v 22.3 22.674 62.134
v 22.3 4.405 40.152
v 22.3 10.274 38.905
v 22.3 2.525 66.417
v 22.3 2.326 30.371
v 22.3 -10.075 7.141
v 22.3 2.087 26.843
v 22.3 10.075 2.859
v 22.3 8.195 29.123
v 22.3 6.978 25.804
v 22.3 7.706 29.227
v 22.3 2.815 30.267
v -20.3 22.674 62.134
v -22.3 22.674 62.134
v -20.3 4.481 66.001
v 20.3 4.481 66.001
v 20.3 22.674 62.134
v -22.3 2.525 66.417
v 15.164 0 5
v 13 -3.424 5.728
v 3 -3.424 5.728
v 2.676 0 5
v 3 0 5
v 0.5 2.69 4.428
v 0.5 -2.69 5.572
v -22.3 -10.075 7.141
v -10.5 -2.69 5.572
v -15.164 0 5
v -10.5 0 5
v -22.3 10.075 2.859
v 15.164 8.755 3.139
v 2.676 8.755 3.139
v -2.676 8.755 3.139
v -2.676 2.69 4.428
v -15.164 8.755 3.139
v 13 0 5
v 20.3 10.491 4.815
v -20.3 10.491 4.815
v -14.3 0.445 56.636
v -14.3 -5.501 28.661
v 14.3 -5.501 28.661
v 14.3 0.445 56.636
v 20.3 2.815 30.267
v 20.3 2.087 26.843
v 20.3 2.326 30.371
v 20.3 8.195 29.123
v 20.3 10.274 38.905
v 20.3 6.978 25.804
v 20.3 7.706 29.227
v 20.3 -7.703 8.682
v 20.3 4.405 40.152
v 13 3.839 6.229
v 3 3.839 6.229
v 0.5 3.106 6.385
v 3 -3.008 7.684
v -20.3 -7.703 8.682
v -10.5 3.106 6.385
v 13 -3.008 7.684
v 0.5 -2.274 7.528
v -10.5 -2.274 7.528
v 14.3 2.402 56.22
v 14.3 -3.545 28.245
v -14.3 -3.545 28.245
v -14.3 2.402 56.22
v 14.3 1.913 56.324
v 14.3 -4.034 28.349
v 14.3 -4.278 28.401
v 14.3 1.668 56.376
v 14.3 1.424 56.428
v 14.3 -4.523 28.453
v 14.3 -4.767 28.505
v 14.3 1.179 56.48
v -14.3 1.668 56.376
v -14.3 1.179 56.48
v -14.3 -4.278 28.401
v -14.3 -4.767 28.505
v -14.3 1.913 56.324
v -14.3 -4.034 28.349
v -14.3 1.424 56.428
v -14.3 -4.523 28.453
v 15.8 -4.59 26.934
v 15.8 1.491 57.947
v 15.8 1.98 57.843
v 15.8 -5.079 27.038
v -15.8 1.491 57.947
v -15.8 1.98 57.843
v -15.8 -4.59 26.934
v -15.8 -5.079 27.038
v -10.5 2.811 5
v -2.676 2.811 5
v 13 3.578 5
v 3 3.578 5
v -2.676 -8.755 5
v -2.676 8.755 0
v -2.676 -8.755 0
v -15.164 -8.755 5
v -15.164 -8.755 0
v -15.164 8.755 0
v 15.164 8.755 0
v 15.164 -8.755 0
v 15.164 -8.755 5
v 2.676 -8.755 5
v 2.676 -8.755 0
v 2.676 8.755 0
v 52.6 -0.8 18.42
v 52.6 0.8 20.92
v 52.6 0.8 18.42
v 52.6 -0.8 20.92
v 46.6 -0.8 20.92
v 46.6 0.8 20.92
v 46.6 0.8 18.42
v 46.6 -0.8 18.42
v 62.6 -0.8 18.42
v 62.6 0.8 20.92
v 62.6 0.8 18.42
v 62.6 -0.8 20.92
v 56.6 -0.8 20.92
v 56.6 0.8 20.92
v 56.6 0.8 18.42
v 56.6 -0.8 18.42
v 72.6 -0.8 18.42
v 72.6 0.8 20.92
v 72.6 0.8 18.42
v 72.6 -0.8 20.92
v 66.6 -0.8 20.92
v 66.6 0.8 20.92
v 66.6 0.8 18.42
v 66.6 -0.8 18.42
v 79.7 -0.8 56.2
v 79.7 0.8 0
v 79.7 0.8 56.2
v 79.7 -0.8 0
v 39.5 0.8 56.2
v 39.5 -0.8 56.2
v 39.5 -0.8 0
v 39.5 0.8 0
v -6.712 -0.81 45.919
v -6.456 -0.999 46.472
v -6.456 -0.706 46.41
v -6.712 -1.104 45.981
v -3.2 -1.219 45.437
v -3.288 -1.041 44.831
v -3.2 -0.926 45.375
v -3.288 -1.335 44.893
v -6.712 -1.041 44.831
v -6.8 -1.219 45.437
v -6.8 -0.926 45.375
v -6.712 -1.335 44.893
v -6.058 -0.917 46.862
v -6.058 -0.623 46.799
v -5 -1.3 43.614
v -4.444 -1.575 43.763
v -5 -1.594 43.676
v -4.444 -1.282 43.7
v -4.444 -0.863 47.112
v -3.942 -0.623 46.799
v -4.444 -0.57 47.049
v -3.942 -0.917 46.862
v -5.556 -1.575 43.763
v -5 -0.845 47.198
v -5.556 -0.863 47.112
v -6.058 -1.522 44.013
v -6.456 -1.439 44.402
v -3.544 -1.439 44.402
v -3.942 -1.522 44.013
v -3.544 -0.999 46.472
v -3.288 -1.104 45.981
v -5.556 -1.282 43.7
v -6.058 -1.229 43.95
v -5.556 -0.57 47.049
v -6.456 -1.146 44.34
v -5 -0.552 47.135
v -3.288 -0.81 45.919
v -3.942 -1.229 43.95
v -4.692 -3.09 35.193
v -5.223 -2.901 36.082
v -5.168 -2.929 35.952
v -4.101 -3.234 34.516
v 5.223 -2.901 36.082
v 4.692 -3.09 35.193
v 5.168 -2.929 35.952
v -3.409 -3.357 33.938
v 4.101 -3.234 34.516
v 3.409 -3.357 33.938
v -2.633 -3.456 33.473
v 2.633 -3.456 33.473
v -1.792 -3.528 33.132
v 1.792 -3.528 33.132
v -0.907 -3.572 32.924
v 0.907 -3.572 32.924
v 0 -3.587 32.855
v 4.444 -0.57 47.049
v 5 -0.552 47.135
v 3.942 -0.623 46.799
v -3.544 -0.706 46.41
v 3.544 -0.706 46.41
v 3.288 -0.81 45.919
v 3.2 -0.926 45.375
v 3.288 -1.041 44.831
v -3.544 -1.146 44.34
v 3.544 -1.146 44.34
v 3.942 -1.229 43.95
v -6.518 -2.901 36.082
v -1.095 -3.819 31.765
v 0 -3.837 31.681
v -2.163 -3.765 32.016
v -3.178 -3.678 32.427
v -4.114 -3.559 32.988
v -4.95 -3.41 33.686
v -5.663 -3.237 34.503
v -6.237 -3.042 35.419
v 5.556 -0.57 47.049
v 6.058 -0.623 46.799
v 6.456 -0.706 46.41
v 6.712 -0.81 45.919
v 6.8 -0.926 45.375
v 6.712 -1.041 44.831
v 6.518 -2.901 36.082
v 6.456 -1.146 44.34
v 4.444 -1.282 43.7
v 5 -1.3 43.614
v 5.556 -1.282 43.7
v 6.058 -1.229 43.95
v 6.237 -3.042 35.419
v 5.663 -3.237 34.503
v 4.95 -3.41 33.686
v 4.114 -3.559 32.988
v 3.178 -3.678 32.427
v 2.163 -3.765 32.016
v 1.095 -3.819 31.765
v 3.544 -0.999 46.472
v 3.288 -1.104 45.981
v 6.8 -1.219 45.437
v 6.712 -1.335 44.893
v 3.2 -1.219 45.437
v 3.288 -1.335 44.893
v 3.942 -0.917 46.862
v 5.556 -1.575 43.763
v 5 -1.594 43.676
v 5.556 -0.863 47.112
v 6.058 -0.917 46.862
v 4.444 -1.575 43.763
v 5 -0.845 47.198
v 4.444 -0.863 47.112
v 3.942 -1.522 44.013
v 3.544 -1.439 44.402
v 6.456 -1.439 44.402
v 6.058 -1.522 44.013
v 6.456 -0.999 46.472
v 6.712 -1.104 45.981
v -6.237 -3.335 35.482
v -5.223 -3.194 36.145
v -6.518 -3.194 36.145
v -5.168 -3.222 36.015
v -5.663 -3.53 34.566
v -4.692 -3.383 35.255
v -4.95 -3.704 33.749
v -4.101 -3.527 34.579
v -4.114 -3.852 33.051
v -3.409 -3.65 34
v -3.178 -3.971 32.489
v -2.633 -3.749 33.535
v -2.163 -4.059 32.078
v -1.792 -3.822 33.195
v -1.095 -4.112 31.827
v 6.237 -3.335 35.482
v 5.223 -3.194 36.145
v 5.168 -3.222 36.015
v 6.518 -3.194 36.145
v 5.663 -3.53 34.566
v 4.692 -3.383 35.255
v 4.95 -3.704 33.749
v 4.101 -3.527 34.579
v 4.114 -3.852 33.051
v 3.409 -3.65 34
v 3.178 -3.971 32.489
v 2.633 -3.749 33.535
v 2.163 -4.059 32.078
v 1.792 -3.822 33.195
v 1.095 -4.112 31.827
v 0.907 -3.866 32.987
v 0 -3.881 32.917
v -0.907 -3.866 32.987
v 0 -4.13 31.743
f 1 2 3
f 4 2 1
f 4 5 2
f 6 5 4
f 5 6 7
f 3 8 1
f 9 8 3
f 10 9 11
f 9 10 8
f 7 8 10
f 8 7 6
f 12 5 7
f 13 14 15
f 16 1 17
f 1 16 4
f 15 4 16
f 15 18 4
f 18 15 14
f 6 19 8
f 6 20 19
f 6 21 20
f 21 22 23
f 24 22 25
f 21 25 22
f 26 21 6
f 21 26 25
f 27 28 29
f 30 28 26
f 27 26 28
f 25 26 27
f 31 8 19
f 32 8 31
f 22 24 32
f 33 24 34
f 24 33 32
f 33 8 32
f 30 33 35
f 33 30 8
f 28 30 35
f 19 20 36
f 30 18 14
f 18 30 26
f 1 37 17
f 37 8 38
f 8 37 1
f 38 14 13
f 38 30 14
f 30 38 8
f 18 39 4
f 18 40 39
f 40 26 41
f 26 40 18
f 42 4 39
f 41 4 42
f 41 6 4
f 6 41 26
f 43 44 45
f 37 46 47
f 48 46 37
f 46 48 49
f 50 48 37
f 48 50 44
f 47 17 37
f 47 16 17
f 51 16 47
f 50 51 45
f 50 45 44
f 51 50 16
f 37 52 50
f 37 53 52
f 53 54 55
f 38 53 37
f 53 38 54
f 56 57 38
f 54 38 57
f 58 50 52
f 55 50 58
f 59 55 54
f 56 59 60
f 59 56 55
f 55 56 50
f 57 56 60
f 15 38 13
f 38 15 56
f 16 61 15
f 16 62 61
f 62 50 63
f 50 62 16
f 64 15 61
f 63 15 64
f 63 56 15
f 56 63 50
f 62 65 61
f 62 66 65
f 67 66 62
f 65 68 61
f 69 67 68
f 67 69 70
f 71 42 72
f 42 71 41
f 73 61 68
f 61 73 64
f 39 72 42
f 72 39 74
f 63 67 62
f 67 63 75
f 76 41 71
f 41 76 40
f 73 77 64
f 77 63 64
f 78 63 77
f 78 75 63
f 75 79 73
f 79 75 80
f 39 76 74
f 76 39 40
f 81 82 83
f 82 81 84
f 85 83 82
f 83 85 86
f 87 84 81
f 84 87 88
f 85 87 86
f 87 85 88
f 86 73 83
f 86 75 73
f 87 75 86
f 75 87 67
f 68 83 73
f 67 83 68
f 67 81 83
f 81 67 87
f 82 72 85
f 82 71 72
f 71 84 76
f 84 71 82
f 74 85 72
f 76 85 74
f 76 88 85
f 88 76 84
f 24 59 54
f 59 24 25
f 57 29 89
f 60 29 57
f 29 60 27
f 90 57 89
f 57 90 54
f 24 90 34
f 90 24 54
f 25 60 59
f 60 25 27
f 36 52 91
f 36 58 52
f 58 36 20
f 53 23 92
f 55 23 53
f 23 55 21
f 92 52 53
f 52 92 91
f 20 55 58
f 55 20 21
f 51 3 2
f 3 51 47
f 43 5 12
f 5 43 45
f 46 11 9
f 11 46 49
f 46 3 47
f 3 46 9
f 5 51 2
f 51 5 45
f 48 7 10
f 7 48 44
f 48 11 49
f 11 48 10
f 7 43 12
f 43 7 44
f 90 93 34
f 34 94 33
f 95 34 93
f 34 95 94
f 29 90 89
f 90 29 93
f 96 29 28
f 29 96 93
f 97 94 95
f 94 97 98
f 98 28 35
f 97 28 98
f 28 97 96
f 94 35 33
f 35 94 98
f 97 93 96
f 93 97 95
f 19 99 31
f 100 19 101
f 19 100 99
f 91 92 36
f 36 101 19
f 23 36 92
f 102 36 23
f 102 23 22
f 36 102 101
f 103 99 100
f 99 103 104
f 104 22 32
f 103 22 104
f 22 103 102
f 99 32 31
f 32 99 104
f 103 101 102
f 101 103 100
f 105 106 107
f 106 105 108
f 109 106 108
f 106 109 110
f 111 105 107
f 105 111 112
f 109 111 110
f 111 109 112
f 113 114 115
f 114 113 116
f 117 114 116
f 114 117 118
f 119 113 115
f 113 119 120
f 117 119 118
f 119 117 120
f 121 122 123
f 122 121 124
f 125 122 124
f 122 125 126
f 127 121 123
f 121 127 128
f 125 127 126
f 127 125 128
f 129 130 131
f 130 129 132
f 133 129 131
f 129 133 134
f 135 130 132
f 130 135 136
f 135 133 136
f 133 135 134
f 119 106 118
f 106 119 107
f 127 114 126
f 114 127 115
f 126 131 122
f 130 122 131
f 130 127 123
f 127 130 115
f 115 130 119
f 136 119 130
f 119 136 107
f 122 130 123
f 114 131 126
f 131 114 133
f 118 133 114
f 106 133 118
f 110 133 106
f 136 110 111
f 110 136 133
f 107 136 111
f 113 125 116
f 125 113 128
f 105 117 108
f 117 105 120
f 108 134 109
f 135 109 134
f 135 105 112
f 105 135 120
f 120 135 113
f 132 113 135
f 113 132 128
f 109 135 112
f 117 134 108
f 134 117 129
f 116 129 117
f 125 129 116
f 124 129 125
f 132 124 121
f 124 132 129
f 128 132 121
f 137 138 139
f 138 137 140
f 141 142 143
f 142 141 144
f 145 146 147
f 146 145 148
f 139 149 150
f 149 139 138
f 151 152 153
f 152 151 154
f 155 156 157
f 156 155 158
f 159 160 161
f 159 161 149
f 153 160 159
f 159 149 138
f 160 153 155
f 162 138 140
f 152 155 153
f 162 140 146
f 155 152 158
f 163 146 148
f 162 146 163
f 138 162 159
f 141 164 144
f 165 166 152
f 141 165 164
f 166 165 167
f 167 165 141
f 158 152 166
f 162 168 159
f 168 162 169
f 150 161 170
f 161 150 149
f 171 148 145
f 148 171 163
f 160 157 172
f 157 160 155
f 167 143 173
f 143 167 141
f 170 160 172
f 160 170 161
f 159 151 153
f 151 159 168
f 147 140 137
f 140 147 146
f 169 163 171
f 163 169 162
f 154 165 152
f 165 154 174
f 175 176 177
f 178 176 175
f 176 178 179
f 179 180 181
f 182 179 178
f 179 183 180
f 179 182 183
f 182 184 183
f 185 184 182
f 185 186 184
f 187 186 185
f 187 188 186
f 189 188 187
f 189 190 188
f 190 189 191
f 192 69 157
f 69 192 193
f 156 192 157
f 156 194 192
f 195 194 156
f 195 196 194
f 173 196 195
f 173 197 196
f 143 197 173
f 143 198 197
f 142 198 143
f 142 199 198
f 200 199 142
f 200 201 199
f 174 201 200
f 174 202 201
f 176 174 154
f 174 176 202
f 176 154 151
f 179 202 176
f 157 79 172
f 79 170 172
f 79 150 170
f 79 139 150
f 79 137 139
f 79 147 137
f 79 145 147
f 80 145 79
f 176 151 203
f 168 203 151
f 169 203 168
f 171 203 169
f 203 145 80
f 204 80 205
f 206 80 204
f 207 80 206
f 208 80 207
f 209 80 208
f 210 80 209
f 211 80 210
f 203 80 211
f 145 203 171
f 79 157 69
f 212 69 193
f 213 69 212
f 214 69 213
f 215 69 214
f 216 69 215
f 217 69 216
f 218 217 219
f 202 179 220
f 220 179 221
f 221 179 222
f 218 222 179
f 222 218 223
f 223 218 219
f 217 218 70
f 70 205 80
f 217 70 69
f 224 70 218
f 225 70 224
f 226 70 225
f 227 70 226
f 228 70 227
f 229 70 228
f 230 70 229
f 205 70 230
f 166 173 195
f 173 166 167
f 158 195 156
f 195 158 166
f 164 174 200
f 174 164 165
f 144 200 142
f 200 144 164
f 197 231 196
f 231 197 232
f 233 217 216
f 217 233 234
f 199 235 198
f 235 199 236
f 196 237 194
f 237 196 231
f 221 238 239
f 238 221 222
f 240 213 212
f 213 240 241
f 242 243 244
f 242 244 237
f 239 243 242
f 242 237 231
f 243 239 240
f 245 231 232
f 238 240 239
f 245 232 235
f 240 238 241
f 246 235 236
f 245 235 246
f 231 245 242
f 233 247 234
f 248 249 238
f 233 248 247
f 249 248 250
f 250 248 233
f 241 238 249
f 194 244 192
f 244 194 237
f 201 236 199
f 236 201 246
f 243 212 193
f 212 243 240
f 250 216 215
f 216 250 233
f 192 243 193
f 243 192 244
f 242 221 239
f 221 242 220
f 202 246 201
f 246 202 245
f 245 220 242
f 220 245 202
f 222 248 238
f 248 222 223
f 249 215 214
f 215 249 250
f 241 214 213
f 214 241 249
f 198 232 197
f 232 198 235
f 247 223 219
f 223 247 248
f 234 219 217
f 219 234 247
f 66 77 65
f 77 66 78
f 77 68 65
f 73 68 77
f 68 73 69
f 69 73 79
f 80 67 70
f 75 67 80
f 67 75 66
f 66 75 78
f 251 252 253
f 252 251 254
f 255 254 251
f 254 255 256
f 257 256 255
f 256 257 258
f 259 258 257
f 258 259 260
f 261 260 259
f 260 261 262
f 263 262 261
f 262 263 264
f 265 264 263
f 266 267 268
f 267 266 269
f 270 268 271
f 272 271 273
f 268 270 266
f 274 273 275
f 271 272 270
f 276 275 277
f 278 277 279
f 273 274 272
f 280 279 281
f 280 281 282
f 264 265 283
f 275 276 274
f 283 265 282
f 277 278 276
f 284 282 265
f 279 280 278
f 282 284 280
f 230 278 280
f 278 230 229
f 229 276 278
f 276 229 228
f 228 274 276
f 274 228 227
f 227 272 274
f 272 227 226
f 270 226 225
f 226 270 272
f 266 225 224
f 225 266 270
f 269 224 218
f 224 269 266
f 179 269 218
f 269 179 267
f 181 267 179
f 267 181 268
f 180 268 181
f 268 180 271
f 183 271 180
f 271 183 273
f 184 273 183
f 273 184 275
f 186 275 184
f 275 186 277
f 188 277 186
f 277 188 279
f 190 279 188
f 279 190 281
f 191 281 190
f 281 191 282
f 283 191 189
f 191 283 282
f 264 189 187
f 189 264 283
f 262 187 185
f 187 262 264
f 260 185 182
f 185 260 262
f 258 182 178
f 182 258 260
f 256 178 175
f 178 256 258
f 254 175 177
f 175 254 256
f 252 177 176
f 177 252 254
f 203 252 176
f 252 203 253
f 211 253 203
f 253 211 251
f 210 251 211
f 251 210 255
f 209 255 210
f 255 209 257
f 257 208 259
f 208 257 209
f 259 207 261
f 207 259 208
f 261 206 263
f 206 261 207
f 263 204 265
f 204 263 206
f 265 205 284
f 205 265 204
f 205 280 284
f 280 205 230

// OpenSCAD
// file: BOSL2/std.scad
// Minimal BOSL2 compatibility shim for bundled gallery models.
// It implements only the helpers used by the imported OpenSCAD projects.

CENTER = [0, 0, 0];
BOTTOM = [0, 0, -1];
TOP = [0, 0, 1];
LEFT = [-1, 0, 0];
RIGHT = [1, 0, 0];
FRONT = [0, -1, 0];
BACK = [0, 1, 0];

module up(z=0) {
    translate([0, 0, z]) children();
}

module down(z=0) {
    translate([0, 0, -z]) children();
}

module attach(anchor=CENTER) {
    children();
}

module cuboid(size=[1, 1, 1], anchor=CENTER) {
    center = anchor == CENTER;
    translate(center ? [0, 0, 0] : [0, 0, size[2] / 2])
        cube(size, center=true);
    children();
}

module xcyl(h=1, r=1, anchor=CENTER) {
    center = anchor == CENTER;
    translate(center ? [0, 0, 0] : [h / 2, 0, 0])
        rotate([0, 90, 0])
            cylinder(h=h, r=r, center=true);
}
// main file
include <BOSL2/std.scad>

// === DTMB Enclosure v3 ===
// Built from official CoreInk diagram
// Portrait: 40w x 56h x 16d, standing upright, screen facing -Y
//
// CUTOUTS NEEDED:
//   Front:  display window, Button G5 access
//   Bottom: USB-C, Grove connector
//   Right:  3-direction switch, power button
//   Top:    EXT.HAT (optional), RST button (optional)

// --- CoreInk hardware dims ---
hw_w = 40;
hw_h = 56;
hw_d = 16;

// --- Display (front face, upper portion) ---
hw_disp_w = 27.6;
hw_disp_h = 27.6;
hw_disp_z = 34;     // center from bottom of CoreInk

// --- Button G5 (front face, below display) ---
hw_g5_w = 6;
hw_g5_h = 4;
hw_g5_z = 18;

// --- USB-C (bottom, offset left) ---
hw_usbc_w = 9;
hw_usbc_d = 3.5;
hw_usbc_x = -5;

// --- Grove (bottom, offset right) ---
hw_grove_w = 8;
hw_grove_d = 5;
hw_grove_x = 8;

// --- 3-Dir Switch (right side, upper) ---
hw_sw_h = 8;
hw_sw_d = 4;
hw_sw_z = 28;

// --- Power button (right side, just below switch) ---
hw_pwr_h = 5;
hw_pwr_d = 3;
hw_pwr_z = 23;

// --- Shell parameters ---
wall = 2.0;
tol = 0.3;
corner_r = 5;
edge_r = 3;       // rounding on ALL edges (iPod-style, no 90° anywhere)

// --- Derived enclosure dims ---
enc_w = hw_w + 2*(wall + tol);
enc_h = hw_h + 2*(wall + tol);
enc_d = hw_d + 2*(wall + tol);

// Z offset: bottom of CoreInk sits at wall+tol above enclosure bottom
ci_z0 = wall + tol;

// --- Display cutout (slightly oversized) ---
disp_cut_w = hw_disp_w + 1.0;
disp_cut_h = hw_disp_h + 1.0;
disp_cut_z = ci_z0 + hw_disp_z;    // center from enclosure bottom

// --- Bezel ---
bezel_extra = 1.5;
bezel_depth = 0.5;

// --- Feet: two simple flat pads ---
foot_w = enc_w * 0.28;
foot_d = enc_d * 0.85;
foot_h = 5;
foot_r = 2;
foot_gap = enc_w * 0.12;

// =====================
// SHELL
// =====================
module shell() {
    difference() {
        // Outer body — rounded on ALL edges, no 90° surfaces
        cuboid([enc_w, enc_d, enc_h],
               rounding=edge_r, edges="ALL",
               anchor=BOTTOM);

        // Inner cavity (open from back, +Y)
        translate([0, wall/2, wall])
            cuboid([enc_w - 2*wall, enc_d - wall, enc_h - wall],
                   rounding=max(corner_r - wall, 1), edges="Z",
                   anchor=BOTTOM);

        // === FRONT FACE (-Y) ===

        // Display window
        translate([0, -enc_d/2, disp_cut_z])
            cuboid([disp_cut_w, wall*2, disp_cut_h], anchor=CENTER);

        // Display bezel recess
        translate([0, -enc_d/2 + wall/2, disp_cut_z])
            cuboid([disp_cut_w + 2*bezel_extra, bezel_depth,
                    disp_cut_h + 2*bezel_extra],
                   rounding=2, edges="Y", anchor=CENTER);

        // Button G5 — no cutout, covered by enclosure (clean front face)

        // === BOTTOM (-Z) ===

        // USB-C
        translate([hw_usbc_x, 0, 0])
            cuboid([hw_usbc_w + 2, hw_usbc_d + 2, wall*2],
                   rounding=1, edges="Z", anchor=CENTER);

        // Grove connector
        translate([hw_grove_x, 0, 0])
            cuboid([hw_grove_w + 2, hw_grove_d + 2, wall*2],
                   rounding=1, edges="Z", anchor=CENTER);

        // === RIGHT SIDE (+X) ===

        // 3-Direction switch
        translate([enc_w/2, 0, ci_z0 + hw_sw_z])
            cuboid([wall*2, hw_sw_d + 2, hw_sw_h + 2],
                   rounding=1, edges="X", anchor=CENTER);

        // Power button
        translate([enc_w/2, 0, ci_z0 + hw_pwr_z])
            cuboid([wall*2, hw_pwr_d + 2, hw_pwr_h + 2],
                   rounding=1, edges="X", anchor=CENTER);

        // === TOP (+Z) — small RST access hole ===
        translate([6, 0, enc_h])
            cuboid([4, 4, wall*2], anchor=CENTER);
    }
}

// =====================
// BACK PLATE
// =====================
module back_plate() {
    bp_w = enc_w - 2*wall - 0.4;
    bp_h = enc_h - 2*wall - 0.4;

    difference() {
        cuboid([bp_w, wall * 0.8, bp_h],
               rounding=max(corner_r - wall, 1), edges="Y",
               anchor=BOTTOM);
        // Vent slots
        for (i = [-1, 0, 1])
            translate([i * 10, 0, bp_h * 0.35])
                cuboid([6, wall + 0.02, 2.5],
                       rounding=0.8, edges="Y", anchor=CENTER);
    }
}

// =====================
// FOOT
// =====================
module foot() {
    // Simple flat-bottom rounded pad
    cuboid([foot_w, foot_d, foot_h],
           rounding=foot_r,
           edges=BOTTOM+LEFT+RIGHT+FRONT+BACK,
           anchor=BOTTOM, $fn=20);
}

// =====================
// ASSEMBLY
// =====================

// --- Tilt angle (lean back so it looks up at you) ---
tilt = -12;  // degrees (negative = lean back, face looks up)

color("WhiteSmoke") {
    // Everything tilts around the base
    translate([0, 0, foot_h])
        rotate([tilt, 0, 0])
            shell();

    // Two feet
    for (sign = [-1, 1])
        translate([sign * (foot_gap/2 + foot_w/2), 0, 0])
            foot();
}

// Back plate (offset for viewing)
color("GhostWhite")
    translate([enc_w + 15, 0, 0])
        back_plate();

// Ghost CoreInk (tilted with body)
%translate([0, 0, foot_h])
    rotate([tilt, 0, 0])
        translate([0, 0, ci_z0 + hw_h/2])
            cube([hw_w, hw_d, hw_h], center=true);

// =====================
// MOOD FACE on display
// =====================
// Sits just proud of the front face, on the display area
// Scale: display is 27.6mm, face lives within that

module mood_face() {
    screen_z = disp_cut_z;
    screen_y = -enc_d/2 + 1.5;

    translate([0, screen_y, screen_z])
    rotate([90, 0, 0]) {
        // E-ink screen background (e-paper white)
        color("White")
            linear_extrude(0.5)
                square([disp_cut_w, disp_cut_h], center=true);

        // Eyes
        color("Black") {
            translate([-5, 3, 0.5])
                linear_extrude(0.3)
                    circle(r=1.8, $fn=20);
            translate([5, 3, 0.5])
                linear_extrude(0.3)
                    circle(r=1.8, $fn=20);
        }

        // Smile
        color("Black")
            translate([0, -4, 0.5])
                linear_extrude(0.3)
                    difference() {
                        circle(r=7, $fn=40);
                        circle(r=5.8, $fn=40);
                        translate([0, 3.5, 0])
                            square([16, 12], center=true);
                    }
    }
}

translate([0, 0, foot_h])
    rotate([tilt, 0, 0])
        mood_face();
